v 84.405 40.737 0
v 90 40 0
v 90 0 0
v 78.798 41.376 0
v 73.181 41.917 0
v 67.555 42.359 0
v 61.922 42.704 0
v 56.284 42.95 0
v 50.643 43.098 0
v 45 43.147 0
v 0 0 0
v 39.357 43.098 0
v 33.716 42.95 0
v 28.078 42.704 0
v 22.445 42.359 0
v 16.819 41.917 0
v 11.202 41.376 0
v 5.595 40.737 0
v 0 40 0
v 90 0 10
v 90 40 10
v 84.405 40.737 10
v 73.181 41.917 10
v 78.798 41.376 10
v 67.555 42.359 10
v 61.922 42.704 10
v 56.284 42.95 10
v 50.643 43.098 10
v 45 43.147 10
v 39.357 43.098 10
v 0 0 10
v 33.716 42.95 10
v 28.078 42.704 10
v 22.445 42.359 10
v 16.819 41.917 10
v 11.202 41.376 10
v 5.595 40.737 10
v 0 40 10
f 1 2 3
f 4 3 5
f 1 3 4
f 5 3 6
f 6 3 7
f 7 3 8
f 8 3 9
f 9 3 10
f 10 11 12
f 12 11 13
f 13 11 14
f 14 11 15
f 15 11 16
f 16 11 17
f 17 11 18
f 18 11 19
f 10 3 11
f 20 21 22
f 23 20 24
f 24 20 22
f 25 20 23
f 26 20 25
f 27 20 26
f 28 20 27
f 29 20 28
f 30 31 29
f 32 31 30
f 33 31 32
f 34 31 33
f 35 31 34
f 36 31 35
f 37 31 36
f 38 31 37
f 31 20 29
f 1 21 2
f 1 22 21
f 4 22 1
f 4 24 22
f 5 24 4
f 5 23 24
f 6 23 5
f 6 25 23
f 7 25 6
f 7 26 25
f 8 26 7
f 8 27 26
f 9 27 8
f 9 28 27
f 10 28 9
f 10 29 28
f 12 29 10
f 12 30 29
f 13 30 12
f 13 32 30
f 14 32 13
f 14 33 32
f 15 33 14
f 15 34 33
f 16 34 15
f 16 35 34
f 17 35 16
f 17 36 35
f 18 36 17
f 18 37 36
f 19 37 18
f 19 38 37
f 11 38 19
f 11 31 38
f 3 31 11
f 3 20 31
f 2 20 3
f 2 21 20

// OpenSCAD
$fn = 32;

// ----------------------------------------------------------------------
// Arc profile plate: crown, 19 points
// ----------------------------------------------------------------------

// --- parameters (mm) ---
bar_l = 90;               // bar length, X
bar_w = 40;               // bar height at the ends, Y
arc_r = 323.34;           // radius of the crown arc
arc_angle = 16;           // crown arc angle, degrees
crown_rise = 3.15;        // rise of the crown over the ends
arc_step = 1;             // sampling step of the crown arc, degrees
plate_t = 10;             // plate thickness, Z

bbox_y = bar_w + crown_rise;  // full height with the crown

profile = [[90, 40], [84.405, 40.737], [78.798, 41.376], [73.181, 41.917], [67.555, 42.359], [61.922, 42.704], [56.284, 42.95], [50.643, 43.098], [45, 43.147], [39.357, 43.098], [33.716, 42.95], [28.078, 42.704], [22.445, 42.359], [16.819, 41.917], [11.202, 41.376], [5.595, 40.737], [0, 40], [0, 0], [90, 0]];  // primary outline, 19 points, counter clockwise

// --- the one profile operation ---
linear_extrude(height = plate_t) polygon(points = profile);
